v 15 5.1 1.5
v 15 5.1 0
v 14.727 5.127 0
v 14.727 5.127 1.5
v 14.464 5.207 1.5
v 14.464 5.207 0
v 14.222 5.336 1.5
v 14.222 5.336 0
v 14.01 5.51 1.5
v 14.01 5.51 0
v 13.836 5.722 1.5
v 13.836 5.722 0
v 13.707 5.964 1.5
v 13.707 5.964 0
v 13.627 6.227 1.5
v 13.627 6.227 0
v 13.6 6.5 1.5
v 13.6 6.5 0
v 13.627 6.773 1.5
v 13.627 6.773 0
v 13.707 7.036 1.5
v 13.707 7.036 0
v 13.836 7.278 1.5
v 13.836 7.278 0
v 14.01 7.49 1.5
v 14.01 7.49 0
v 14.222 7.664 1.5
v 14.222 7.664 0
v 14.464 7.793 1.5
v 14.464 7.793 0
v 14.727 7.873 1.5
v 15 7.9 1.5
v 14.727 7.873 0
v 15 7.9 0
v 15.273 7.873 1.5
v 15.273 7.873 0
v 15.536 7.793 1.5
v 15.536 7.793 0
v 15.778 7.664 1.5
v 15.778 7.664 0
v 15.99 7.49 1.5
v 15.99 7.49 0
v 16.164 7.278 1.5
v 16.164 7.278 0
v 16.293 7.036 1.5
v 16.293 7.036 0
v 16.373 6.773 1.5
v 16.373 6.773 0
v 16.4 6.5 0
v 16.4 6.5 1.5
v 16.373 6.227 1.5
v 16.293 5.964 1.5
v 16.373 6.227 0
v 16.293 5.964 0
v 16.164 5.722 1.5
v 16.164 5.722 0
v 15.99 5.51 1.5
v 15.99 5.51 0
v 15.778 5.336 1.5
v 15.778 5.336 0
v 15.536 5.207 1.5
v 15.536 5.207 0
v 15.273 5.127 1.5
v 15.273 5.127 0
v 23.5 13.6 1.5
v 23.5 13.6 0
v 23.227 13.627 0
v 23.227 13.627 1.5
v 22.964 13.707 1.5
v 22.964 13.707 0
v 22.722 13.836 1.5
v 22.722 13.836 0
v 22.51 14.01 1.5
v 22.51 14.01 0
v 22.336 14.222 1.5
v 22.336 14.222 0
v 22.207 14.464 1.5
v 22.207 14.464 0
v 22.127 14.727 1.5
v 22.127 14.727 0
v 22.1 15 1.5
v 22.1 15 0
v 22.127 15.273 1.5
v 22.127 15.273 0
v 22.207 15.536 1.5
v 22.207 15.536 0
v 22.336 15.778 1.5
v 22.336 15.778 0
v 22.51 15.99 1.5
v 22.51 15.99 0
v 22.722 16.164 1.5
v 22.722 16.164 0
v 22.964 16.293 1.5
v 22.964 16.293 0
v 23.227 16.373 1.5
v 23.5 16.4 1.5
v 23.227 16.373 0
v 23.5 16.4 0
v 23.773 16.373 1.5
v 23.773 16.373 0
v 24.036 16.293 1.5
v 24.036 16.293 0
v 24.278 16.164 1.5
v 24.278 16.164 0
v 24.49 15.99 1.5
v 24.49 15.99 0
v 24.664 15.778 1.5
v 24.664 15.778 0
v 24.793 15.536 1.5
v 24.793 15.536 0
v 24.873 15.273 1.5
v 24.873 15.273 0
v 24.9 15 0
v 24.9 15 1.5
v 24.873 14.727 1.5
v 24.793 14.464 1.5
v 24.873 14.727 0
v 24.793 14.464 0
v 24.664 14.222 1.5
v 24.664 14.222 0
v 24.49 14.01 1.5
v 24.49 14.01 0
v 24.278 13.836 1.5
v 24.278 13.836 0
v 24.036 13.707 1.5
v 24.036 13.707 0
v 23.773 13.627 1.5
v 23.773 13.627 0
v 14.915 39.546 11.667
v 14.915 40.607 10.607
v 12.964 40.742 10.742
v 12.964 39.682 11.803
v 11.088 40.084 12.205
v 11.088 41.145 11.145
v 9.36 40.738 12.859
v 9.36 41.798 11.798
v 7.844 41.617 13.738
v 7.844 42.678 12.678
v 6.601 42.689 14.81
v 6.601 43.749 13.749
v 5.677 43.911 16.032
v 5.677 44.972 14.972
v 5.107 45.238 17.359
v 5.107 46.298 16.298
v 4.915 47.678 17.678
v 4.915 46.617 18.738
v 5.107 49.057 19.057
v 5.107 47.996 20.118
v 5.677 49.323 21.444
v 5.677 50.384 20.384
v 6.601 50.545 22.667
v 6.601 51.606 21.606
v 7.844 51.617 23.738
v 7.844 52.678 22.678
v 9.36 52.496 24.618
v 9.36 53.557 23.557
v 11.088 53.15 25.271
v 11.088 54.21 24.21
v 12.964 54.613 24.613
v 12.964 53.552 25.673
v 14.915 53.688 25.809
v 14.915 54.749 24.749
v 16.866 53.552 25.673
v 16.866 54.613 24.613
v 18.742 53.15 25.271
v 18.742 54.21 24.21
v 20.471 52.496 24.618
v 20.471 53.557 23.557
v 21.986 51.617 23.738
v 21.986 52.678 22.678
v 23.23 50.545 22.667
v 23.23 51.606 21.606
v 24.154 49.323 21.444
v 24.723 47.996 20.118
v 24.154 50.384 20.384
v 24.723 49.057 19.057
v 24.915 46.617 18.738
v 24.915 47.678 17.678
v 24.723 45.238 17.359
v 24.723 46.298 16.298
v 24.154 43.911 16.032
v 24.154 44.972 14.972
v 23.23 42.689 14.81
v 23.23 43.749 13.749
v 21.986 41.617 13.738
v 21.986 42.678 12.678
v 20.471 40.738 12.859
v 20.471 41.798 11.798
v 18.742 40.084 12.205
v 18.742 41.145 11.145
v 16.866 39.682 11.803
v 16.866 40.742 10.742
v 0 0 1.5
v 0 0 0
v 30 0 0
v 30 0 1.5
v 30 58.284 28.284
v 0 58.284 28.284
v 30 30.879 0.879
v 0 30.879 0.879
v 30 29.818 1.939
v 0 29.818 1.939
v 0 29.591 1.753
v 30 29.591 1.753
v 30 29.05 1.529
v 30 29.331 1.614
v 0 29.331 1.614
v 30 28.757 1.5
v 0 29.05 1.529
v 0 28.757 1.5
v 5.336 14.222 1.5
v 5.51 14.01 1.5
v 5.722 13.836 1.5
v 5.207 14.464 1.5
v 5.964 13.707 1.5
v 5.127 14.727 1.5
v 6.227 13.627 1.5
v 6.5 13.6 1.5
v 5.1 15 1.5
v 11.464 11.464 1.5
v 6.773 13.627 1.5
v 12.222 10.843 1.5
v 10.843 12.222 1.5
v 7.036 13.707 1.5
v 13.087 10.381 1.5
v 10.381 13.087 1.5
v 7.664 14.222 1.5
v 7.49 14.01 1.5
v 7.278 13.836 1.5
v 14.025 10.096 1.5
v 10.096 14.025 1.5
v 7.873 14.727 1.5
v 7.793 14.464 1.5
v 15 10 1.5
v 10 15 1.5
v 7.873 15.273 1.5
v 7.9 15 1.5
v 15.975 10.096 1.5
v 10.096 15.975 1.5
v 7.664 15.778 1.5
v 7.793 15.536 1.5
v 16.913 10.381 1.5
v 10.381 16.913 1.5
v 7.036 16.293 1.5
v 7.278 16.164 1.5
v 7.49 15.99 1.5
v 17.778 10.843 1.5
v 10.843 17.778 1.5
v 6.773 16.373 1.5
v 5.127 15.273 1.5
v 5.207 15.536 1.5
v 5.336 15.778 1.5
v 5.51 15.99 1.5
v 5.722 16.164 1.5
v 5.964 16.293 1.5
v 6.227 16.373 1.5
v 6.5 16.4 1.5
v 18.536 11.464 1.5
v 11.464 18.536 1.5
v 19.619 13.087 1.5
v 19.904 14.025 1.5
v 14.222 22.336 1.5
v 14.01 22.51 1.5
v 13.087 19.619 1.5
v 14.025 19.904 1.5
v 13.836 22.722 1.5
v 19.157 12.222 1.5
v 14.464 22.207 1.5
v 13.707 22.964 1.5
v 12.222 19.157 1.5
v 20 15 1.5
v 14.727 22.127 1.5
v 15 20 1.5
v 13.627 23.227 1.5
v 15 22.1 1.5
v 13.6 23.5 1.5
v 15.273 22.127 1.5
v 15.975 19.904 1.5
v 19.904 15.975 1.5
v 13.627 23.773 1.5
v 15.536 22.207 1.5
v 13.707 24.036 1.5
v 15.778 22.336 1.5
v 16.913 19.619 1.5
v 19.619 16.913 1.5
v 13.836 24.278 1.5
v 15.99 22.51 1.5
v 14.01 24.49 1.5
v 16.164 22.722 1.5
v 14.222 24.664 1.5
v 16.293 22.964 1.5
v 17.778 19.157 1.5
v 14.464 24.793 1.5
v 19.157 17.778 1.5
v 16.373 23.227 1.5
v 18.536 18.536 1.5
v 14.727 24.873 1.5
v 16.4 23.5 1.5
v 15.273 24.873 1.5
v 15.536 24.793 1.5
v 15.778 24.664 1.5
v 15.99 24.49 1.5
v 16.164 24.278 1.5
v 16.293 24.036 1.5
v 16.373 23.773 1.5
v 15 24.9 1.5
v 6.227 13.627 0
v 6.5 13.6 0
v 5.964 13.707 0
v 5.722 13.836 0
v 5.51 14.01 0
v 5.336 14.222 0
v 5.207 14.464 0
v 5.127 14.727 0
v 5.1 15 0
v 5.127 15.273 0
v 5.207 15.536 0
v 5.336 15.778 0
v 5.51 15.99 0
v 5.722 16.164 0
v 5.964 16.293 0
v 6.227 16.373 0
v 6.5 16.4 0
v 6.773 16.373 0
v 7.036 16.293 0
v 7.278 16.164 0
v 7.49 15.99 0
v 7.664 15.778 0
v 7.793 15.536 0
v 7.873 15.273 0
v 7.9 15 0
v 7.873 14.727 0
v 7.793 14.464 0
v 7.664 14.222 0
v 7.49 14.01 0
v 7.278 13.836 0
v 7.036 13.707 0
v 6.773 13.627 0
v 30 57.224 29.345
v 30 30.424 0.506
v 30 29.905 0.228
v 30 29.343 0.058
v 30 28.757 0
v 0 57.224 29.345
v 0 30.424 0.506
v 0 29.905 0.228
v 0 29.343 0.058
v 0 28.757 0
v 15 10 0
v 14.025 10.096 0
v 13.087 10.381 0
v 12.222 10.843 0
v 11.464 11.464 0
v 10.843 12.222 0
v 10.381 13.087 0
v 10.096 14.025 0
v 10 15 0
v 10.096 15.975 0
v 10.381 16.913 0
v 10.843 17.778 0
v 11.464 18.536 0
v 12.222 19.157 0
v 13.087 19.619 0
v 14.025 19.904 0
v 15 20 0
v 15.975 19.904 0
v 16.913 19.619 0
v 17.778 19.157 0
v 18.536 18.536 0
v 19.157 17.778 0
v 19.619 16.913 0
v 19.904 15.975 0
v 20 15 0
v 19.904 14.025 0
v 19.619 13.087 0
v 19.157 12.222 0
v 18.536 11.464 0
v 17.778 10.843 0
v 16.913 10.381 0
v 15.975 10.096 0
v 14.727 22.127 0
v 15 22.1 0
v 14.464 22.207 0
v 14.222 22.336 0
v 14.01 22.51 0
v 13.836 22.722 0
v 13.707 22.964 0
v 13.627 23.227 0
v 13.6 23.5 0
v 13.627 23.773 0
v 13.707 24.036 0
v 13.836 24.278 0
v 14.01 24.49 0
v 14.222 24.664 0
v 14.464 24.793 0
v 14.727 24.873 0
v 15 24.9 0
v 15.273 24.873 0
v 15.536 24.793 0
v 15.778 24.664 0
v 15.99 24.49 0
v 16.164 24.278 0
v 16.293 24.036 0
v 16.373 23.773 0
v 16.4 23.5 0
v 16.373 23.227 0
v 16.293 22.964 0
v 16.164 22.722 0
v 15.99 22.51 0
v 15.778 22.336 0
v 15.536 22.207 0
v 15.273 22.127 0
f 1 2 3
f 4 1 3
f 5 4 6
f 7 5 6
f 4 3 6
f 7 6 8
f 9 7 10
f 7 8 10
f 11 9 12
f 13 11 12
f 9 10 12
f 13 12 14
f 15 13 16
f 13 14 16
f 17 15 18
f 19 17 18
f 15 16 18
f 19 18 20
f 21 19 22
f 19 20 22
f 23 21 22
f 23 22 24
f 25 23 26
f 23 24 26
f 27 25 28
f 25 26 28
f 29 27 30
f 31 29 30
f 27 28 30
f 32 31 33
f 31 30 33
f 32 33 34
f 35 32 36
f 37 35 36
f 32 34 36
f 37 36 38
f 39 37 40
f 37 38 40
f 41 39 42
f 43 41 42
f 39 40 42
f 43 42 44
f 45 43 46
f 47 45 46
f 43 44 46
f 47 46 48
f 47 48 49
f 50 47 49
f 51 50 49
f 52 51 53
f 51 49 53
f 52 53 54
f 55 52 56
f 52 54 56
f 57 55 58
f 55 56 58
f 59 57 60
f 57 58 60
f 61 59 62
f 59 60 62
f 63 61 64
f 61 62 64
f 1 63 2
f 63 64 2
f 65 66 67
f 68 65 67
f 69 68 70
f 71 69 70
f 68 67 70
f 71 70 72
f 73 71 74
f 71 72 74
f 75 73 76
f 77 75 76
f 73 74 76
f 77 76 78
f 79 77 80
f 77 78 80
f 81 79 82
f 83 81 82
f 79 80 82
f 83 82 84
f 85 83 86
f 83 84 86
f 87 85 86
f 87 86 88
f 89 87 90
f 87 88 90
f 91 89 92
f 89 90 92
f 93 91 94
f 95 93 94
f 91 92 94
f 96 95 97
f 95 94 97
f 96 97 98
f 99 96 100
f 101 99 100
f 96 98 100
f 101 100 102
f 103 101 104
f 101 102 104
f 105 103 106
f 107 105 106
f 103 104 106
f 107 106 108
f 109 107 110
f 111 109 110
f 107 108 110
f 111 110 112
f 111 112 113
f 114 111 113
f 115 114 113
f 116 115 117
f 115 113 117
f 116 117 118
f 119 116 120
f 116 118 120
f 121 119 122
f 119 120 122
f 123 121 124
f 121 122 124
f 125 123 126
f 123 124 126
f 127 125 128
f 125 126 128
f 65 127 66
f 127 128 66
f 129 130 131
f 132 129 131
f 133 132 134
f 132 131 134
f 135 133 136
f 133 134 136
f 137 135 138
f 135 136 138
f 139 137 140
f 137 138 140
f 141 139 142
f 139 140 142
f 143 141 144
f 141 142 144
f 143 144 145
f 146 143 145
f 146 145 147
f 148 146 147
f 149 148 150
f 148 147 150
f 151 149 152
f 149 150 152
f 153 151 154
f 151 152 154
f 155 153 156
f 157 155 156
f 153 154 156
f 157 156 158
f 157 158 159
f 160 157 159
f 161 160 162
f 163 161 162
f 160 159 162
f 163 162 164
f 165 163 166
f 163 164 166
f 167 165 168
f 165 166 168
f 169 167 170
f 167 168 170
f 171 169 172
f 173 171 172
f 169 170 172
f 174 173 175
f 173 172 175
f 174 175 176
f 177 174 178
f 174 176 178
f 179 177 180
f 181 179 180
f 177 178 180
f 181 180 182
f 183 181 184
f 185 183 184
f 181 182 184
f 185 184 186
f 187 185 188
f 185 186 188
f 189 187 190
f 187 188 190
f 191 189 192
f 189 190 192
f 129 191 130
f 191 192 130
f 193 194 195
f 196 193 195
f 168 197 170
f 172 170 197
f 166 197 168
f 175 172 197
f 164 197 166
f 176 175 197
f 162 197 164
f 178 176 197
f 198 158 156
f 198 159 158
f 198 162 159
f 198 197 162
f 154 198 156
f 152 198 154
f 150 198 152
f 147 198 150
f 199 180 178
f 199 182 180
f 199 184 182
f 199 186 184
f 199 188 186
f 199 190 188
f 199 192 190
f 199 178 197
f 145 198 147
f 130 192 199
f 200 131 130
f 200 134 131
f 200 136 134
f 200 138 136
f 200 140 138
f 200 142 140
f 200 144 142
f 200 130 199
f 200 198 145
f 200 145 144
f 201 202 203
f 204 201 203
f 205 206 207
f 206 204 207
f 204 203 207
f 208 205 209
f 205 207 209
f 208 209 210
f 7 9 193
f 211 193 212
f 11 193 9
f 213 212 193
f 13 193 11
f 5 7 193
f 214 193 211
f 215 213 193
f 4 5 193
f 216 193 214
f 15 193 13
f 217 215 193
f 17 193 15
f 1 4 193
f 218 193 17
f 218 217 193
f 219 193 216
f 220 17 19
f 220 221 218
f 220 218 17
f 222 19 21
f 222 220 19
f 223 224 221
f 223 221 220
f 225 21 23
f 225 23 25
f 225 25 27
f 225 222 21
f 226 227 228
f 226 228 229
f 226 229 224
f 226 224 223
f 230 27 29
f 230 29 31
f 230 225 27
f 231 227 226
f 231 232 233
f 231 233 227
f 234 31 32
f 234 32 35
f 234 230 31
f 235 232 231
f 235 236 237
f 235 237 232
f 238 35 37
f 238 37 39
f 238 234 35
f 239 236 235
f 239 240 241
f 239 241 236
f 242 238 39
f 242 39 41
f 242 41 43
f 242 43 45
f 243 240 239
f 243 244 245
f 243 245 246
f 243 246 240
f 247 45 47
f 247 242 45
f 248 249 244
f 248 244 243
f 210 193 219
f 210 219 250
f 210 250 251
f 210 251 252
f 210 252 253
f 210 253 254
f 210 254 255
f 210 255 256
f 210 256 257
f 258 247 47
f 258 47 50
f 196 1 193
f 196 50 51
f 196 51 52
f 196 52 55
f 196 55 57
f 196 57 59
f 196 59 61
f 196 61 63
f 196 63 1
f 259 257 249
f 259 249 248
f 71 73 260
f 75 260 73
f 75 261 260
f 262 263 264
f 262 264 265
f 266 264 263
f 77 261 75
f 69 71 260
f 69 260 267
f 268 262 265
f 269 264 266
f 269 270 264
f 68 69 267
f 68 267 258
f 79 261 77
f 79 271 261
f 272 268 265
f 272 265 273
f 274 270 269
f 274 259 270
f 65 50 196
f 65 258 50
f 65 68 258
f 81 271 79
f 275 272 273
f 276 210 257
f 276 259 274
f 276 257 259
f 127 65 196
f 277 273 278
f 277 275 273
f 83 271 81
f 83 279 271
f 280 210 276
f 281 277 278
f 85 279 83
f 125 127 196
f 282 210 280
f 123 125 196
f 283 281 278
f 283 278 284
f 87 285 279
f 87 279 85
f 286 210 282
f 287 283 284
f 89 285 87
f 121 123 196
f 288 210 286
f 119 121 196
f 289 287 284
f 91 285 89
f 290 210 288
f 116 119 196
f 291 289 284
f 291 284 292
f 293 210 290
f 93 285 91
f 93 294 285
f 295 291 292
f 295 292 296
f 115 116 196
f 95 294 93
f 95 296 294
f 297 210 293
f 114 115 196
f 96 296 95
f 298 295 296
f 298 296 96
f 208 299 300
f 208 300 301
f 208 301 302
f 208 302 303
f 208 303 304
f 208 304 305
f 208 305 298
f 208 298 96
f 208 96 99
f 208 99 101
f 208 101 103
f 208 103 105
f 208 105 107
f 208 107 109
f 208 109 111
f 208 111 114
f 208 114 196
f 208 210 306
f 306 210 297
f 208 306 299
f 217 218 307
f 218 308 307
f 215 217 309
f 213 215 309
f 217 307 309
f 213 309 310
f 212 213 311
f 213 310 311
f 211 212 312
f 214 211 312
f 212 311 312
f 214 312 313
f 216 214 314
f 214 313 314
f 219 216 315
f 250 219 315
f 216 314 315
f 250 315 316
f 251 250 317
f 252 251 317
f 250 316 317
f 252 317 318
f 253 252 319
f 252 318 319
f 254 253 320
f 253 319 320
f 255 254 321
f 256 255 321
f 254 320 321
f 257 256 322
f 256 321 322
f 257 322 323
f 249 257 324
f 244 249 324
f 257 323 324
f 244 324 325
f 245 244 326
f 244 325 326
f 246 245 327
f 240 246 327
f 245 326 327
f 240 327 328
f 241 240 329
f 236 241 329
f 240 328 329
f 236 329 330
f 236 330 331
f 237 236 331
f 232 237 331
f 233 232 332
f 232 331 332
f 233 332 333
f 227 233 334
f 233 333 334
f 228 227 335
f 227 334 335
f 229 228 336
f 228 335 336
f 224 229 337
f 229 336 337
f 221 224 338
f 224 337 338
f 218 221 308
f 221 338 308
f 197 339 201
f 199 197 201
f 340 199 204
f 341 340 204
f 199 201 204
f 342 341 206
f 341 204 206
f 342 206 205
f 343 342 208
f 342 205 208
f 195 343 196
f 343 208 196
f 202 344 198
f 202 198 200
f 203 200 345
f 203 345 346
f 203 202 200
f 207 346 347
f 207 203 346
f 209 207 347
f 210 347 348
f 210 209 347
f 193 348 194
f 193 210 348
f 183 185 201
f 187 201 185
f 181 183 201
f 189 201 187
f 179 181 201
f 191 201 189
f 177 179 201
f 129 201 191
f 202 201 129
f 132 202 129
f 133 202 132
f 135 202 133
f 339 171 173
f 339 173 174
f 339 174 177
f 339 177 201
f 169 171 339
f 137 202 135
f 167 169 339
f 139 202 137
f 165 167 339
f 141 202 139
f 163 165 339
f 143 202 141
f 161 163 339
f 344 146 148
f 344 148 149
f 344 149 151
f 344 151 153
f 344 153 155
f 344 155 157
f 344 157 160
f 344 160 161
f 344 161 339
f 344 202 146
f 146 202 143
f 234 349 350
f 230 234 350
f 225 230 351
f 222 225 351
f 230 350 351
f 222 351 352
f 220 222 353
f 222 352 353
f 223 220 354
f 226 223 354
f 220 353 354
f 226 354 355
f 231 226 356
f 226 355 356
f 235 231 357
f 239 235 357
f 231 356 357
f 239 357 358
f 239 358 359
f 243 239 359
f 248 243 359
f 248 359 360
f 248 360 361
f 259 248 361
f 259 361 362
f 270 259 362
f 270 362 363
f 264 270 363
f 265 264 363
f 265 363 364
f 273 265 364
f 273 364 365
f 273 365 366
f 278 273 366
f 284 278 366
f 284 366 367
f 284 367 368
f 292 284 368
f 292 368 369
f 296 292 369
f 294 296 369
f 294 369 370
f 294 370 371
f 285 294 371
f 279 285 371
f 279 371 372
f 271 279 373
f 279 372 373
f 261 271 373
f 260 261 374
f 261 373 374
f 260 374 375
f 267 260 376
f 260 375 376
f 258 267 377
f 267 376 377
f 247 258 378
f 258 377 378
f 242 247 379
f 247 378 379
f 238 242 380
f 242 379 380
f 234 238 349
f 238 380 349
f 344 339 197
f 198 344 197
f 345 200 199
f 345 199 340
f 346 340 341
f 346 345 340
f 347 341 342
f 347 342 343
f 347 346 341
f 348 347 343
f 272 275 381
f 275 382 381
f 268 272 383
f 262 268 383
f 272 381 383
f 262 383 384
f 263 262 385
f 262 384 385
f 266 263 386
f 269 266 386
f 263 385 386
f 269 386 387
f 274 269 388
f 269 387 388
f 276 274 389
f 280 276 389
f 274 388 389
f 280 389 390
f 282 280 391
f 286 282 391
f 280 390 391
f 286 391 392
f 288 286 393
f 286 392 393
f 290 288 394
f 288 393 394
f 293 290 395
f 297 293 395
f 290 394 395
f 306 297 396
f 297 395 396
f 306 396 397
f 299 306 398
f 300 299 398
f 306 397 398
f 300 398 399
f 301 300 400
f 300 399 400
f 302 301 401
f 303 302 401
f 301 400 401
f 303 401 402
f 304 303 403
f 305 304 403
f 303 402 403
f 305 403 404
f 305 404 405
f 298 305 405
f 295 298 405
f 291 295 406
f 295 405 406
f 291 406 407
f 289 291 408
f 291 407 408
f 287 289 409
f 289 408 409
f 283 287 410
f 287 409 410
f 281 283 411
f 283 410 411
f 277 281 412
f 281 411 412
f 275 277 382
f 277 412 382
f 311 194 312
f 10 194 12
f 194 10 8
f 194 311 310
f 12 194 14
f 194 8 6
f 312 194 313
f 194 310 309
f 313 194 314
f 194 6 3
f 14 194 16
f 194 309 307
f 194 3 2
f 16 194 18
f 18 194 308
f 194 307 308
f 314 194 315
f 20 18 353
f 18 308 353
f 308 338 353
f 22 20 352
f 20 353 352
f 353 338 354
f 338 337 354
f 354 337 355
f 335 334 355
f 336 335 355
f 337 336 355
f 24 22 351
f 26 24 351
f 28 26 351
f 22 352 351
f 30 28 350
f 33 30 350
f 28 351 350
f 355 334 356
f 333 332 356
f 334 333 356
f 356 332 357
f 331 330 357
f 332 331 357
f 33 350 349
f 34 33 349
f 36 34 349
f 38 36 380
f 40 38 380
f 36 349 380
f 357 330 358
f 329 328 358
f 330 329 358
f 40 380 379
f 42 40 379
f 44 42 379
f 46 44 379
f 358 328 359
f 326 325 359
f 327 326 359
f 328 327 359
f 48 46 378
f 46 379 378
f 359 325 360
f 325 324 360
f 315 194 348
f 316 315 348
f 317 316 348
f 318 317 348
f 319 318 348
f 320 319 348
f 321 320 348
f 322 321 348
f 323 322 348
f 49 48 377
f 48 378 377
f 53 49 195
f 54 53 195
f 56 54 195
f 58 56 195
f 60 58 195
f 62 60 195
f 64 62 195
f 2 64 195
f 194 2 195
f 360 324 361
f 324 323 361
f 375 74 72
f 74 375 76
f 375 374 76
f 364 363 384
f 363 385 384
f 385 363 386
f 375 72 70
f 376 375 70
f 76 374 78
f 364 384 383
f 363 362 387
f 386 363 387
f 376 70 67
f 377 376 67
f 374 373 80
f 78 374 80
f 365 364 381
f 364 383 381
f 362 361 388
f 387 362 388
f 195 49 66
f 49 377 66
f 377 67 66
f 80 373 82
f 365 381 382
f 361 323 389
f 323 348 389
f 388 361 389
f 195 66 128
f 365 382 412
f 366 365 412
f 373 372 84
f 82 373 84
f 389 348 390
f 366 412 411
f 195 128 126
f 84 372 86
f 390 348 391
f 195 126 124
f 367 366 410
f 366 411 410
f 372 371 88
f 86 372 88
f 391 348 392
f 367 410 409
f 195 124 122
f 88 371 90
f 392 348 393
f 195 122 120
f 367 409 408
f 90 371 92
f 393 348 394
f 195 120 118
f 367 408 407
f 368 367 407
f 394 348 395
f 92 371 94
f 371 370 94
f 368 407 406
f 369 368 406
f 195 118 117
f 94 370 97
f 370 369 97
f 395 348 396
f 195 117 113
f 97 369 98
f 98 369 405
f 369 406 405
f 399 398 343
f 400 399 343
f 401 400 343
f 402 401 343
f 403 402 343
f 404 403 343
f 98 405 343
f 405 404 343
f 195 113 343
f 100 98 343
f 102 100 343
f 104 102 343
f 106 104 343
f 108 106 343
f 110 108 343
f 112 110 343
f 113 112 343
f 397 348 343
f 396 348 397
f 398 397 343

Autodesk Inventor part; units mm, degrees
ref_plane "YZ Plane" through (0, 0, 0) normal (1, 0, 0) x (0, 1, 0)
ref_plane "XZ Plane" through (0, 0, 0) normal (0, 1, 0) x (-1, 0, 0)
ref_plane "XY Plane" through (0, 0, 0) normal (0, 0, 1) x (1, 0, 0)
sketch "スケッチ2" plane through (0, 0, 0) normal (0, 0, 1) x (1, 0, 0)
  line L0 (0, 0) -> (30, 0)
  line L1 (30, 0) -> (30, 30)
  line L2 (30, 30) -> (0, 30)
  line L3 (0, 30) -> (0, 0)
  dimension "d0" = 30
  dimension "d1" = 30
extrude "プレート1" add sketch "スケッチ2" along normal blind 1.5
sketch "スケッチ5" plane through (0, 28.9393, 1.0607) normal (0, 0.7071068, -0.7071068) x (-1, 0, 0)
  line L0 (-30, 0) -> (0, 0)
  line L1 (0, 0) -> (0, 40)
  line L2 (0, 40) -> (-30, 40)
  line L3 (-30, 40) -> (-30, 0)
edge flange "フランジ1" height 40 angle 45 thickness 1.5 bend radius 1.5 thickness toward (0, 0.7071068, -0.7071068) relief tear relief width 1.5 relief depth 0.75 edges at (15, 30, 1.5) wall of the first edge with corners at (30, 28.9393, 1.0607) (0, 28.9393, 1.0607) (0, 57.2236, 29.3449) (30, 57.2236, 29.3449)
bend "曲げ1"
corner "コーナー1"
sketch "スケッチ6" plane through (0, 0, 1.5) normal (0, 0, 1) x (1, 0, 0)
  line L0 (30, 0) -> (0, 0) projected
  line L1 (15, 0) -> (15, 28.7574) construction
  line L2 (30, 28.7574) -> (0, 28.7574) projected
  line L3 (0, 0) -> (0, 28.7574) projected
  line L4 (0, 15) -> (30, 15) construction
  point P0 (15, 15)
  dimension "d34" = 15
hole "穴3" at (15, 15, 1.5) direction (0, 0, -1) diameter 10 end through all
sketch "スケッチ7" plane through (0, 0, 1.5) normal (0, 0, 1) x (1, 0, 0)
  circle A0 centre (15, 15) radius 5 projected
  line L0 (30, 28.7574) -> (0, 28.7574) projected
  line L1 (0, 0) -> (0, 28.7574) projected
  line L2 (30, 0) -> (0, 0) projected
  line L3 (30, 28.7574) -> (30, 0) projected
  line L4 (15, 15) -> (30, 15) construction
  line L5 (30, 0) -> (30, 28.7574) projected
  line L6 (15, 15) -> (15, 30) construction
  line L7 (15, 15) -> (0, 15) construction
  line L8 (15, 15) -> (15, 0) construction
  point P0 (23.5, 15)
  point P1 (15, 23.5)
  point P2 (6.5, 15)
  point P3 (15, 6.5)
  dimension "d42" = 8.5
  dimension "d45" = 360
hole "穴4" at (23.5, 15, 1.5) at (15, 23.5, 1.5) at (6.5, 15, 1.5) at (15, 6.5, 1.5) direction (0, 0, -1) diameter 2.8 end through all
sketch "スケッチ8" plane through (0, 57.2236, 29.3449) normal (0, -0.7071068, 0.7071068) x (1, 0, 0)
  line L0 (30, 0) -> (0, 0) projected
  line L1 (15, 0) -> (15, -38.7574) construction
  line L2 (0, -38.7574) -> (30, -38.7574) projected
  line L3 (0, -38.7574) -> (0, 0) projected
  line L4 (0, -15) -> (29.8306, -15) construction
  point P0 (0, -61.2132)
  point P1 (14.9153, -15)
  dimension "d54" = 15
hole "穴5" at (14.9153, 46.617, 18.7383) direction (0, 0.7071068, -0.7071068) diameter 20 end through all
equation "\"d23\" = Thickness"
equation "\"d24\" = BendReliefWidth"
equation "\"d25\" = BendReliefDepth"
equation "\"d26\" = MinimumRemnant"
equation "\"d27\" = TransitionRadius"
equation "\"d30\" = BendRadius"
equation "\"d31\" = CornerReliefSize"
equation "\"d32\" = GapSize"
equation "\"d33\" = JacobiRadiusSize"
equation "\"BendRadius\" = Thickness"
equation "\"BendReliefWidth\" = Thickness"
equation "\"BendReliefDepth\" = 0.5 * Thickness"
equation "\"CornerReliefSize\" = 4 * Thickness"
equation "\"MinimumRemnant\" = 2 * Thickness"
equation "\"TransitionRadius\" = BendRadius"
equation "\"JacobiRadiusSize\" = BendRadius"
equation "\"GapSize\" = Thickness"
equation "\"Thickness\" = 1.5"
properties part number "head"
